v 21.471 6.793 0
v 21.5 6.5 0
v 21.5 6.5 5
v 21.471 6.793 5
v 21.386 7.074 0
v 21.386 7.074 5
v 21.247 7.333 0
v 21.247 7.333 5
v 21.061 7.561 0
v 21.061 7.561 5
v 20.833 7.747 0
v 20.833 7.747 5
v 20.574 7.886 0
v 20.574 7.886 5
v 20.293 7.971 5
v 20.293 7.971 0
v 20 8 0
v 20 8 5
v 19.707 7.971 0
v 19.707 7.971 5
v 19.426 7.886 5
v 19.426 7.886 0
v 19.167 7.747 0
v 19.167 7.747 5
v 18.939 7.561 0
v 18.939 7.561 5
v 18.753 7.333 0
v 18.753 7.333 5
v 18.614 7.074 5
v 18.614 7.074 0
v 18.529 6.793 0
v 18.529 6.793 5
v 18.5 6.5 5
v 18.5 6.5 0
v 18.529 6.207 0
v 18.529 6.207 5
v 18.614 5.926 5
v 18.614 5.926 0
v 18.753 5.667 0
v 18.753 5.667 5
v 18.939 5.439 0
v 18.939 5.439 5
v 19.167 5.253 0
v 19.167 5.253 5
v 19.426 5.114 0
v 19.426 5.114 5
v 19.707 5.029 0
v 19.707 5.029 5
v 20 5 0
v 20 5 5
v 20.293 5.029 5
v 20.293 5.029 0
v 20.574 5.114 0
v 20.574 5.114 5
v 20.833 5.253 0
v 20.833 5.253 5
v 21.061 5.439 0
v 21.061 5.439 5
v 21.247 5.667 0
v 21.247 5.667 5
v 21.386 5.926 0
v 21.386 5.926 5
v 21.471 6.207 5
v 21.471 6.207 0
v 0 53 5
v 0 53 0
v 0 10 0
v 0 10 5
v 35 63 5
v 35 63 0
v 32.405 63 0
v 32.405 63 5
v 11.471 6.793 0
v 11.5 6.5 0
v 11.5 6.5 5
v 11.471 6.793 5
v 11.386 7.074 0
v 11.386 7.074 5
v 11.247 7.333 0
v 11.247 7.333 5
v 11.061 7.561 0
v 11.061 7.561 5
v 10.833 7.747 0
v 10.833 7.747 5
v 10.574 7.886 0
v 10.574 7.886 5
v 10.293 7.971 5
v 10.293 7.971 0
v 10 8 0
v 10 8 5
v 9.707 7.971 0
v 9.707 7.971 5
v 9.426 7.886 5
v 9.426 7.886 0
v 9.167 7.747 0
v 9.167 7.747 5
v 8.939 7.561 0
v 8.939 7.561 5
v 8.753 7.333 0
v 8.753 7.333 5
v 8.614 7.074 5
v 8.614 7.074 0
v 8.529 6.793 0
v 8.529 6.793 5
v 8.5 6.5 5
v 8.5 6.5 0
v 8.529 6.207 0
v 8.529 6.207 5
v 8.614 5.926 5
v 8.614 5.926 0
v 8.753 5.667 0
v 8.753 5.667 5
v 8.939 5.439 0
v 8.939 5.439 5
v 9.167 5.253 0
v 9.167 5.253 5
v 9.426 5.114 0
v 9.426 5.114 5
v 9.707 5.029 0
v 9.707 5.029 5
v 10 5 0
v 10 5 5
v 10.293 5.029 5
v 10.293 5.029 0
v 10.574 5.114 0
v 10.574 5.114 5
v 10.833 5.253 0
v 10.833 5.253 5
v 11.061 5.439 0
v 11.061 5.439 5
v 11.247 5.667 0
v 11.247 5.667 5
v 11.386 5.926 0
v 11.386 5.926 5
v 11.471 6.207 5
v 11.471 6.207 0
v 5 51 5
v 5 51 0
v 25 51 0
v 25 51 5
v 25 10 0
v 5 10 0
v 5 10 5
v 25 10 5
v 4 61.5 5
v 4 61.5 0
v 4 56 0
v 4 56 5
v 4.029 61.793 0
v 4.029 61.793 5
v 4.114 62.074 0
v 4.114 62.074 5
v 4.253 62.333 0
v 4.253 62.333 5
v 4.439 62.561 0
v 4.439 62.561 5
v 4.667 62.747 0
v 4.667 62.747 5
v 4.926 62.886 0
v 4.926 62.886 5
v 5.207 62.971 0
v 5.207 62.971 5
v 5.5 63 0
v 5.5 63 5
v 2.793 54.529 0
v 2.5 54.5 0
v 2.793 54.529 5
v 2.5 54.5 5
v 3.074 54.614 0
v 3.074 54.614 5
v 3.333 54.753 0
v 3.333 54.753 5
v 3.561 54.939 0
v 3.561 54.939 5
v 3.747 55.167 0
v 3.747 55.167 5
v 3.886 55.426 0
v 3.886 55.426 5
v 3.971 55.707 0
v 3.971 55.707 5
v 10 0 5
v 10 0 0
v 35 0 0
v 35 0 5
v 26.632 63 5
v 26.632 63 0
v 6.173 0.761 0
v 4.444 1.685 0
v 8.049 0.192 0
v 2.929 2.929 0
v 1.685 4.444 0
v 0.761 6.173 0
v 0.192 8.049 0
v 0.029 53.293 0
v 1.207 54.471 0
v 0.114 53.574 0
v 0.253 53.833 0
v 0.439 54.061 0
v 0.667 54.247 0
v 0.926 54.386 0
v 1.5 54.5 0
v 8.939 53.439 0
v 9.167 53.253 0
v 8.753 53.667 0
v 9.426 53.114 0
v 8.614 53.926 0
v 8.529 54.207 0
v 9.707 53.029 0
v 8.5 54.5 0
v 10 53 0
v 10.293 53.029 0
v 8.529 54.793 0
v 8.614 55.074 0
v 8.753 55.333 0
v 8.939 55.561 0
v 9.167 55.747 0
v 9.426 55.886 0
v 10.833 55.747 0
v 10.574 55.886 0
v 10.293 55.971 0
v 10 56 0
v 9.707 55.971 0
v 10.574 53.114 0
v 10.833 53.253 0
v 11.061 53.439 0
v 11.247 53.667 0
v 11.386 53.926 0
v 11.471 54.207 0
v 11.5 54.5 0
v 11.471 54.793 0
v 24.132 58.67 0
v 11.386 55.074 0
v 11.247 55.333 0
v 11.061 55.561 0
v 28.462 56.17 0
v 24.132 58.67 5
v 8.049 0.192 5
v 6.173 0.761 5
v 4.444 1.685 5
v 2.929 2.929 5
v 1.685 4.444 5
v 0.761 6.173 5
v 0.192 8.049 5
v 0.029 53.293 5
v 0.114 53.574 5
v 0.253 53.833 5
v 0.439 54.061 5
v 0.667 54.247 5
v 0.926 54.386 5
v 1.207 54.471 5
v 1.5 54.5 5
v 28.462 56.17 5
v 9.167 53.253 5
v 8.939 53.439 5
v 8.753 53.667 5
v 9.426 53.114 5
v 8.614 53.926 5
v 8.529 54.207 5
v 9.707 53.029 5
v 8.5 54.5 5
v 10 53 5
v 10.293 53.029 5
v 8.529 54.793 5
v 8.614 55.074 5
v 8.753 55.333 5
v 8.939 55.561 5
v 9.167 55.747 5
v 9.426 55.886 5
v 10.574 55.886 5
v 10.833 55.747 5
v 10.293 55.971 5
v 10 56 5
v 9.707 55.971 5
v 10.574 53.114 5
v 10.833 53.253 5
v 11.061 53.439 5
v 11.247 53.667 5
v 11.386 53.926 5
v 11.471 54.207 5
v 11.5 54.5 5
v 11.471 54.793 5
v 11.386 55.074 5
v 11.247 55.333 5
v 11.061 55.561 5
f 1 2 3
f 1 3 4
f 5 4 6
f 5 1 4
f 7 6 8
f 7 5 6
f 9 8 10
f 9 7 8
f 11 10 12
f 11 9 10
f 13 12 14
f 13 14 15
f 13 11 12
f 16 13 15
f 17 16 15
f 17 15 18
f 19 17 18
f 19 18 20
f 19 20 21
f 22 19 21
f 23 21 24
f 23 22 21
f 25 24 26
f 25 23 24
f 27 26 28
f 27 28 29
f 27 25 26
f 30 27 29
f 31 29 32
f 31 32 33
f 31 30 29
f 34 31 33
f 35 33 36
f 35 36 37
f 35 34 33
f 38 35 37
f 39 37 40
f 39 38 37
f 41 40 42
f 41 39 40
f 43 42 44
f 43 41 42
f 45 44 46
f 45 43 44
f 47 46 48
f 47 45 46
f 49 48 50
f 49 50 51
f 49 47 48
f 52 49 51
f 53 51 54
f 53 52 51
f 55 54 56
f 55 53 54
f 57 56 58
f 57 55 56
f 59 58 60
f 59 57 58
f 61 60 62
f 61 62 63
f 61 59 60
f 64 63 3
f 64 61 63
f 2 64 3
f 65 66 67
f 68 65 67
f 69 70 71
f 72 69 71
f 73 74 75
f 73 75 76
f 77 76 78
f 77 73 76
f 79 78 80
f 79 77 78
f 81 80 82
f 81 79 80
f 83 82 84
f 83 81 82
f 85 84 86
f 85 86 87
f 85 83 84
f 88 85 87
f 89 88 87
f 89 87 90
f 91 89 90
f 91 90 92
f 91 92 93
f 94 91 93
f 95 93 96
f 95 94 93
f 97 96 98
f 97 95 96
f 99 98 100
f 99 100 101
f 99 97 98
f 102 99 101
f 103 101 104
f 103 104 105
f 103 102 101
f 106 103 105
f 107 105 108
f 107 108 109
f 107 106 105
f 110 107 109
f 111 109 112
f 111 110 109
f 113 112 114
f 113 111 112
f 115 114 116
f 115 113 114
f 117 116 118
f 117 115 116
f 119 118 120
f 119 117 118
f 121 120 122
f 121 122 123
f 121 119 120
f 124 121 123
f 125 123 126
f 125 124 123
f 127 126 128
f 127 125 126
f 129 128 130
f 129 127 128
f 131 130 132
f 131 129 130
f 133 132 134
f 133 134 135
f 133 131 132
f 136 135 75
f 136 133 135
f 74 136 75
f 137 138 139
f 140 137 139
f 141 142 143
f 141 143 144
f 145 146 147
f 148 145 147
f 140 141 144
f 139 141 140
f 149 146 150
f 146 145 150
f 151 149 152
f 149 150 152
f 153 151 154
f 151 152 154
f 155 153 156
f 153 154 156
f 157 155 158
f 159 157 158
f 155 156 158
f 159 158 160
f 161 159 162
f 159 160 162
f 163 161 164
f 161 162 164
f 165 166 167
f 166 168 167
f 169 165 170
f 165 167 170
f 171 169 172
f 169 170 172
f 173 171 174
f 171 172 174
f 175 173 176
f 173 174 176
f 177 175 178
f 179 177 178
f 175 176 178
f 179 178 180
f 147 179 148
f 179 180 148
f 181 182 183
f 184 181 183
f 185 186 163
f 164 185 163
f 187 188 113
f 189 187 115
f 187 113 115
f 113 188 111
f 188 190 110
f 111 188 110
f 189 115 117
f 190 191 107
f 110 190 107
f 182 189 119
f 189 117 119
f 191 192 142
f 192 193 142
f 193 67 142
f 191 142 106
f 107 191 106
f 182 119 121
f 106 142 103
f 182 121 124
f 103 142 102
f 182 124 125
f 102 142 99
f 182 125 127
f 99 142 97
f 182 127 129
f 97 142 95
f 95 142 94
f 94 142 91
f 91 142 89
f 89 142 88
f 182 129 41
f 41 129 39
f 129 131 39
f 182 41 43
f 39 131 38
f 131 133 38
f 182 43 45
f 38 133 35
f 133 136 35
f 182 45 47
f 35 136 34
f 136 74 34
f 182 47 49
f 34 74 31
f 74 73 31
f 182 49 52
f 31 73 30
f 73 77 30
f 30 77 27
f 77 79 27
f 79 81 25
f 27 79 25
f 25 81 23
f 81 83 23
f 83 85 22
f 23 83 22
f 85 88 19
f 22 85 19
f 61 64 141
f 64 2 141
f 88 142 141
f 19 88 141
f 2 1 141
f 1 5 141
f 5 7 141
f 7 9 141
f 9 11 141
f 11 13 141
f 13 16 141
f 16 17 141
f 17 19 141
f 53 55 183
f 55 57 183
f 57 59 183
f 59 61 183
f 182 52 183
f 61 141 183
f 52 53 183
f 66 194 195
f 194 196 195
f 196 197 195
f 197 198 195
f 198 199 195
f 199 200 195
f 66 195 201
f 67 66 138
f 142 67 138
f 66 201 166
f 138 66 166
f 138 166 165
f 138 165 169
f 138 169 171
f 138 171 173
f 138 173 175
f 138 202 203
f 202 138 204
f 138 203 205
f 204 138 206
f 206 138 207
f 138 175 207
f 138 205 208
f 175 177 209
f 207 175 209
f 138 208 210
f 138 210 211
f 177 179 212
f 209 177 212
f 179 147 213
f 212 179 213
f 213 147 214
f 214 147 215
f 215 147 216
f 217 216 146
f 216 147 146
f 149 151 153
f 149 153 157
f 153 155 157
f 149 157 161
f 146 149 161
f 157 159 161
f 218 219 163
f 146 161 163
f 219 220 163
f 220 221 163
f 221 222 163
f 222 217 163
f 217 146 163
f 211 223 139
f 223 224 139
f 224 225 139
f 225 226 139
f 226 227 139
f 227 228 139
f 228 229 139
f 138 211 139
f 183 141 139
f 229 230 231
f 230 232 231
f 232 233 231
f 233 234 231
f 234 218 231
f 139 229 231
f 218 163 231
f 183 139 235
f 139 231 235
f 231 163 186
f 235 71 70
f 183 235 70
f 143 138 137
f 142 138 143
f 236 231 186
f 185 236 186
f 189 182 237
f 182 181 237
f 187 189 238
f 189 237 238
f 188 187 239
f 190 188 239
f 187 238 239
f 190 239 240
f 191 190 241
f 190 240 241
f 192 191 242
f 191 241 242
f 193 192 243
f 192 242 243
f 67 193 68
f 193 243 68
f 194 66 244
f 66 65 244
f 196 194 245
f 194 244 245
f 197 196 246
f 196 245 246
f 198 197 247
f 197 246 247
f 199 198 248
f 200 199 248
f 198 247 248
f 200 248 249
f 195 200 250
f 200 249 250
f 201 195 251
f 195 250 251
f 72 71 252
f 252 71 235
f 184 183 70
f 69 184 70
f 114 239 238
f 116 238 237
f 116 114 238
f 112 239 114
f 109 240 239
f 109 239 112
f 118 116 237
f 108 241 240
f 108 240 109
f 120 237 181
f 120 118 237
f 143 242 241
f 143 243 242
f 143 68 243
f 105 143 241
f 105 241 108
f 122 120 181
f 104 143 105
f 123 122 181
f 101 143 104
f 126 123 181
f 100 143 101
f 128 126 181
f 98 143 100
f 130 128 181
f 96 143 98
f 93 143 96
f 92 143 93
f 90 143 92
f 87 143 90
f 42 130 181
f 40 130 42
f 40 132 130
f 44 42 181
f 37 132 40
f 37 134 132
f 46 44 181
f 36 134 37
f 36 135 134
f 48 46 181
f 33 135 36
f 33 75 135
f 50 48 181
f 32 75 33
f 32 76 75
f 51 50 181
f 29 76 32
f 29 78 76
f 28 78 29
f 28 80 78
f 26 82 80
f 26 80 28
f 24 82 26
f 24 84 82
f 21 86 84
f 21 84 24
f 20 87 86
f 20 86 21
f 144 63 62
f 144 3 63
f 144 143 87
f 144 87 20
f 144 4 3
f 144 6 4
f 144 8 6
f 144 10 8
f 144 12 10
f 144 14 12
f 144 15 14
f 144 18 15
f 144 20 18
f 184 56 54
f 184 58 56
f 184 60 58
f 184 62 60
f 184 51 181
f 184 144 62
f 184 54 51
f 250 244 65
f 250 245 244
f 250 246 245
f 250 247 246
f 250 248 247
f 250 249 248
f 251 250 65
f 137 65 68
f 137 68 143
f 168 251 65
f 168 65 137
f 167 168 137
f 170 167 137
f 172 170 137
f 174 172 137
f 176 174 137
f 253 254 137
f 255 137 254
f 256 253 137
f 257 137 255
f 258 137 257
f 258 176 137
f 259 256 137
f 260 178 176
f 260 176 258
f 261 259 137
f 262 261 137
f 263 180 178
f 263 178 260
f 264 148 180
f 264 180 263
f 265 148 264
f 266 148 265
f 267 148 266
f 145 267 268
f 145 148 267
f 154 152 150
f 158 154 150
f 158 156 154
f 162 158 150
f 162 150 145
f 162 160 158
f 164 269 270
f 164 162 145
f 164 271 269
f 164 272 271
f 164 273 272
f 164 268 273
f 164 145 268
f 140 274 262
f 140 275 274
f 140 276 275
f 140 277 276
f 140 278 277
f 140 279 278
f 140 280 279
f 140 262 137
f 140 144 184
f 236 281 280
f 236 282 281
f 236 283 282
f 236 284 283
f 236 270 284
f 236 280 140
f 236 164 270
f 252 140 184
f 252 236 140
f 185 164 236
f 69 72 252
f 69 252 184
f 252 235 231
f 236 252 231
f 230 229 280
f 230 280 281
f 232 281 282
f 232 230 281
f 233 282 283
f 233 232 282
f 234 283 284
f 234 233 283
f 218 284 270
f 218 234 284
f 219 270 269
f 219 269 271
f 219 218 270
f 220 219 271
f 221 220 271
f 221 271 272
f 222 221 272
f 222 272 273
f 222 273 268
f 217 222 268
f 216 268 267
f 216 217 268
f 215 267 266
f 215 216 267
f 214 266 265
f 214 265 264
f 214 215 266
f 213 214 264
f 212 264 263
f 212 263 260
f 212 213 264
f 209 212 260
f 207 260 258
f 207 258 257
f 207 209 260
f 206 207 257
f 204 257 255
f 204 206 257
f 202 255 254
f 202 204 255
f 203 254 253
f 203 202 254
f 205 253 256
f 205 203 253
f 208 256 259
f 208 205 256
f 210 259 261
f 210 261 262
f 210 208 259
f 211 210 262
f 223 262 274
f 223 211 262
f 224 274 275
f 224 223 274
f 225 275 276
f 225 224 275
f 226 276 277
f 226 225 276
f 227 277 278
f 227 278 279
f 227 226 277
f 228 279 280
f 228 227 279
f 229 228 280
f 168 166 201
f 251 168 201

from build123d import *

# Parameters (mm, degrees)
ESQUISSE1_R        = 1.5
BOSS_EXTRU_1_DEPTH = 5
CONG_2_R           = 10
CONG_4_R           = 1.5


with BuildPart() as part:
    # Esquisse1 → Boss.-Extru.1 (new body)
    with BuildSketch(Plane.XY):
        Polygon((0, 0), (25, 0), (35, 0), (35, 63), (32.405486101, 63), (28.462110428, 56.169872981), (24.131983409, 58.669872981), (26.631983409, 63), (4, 63), (4, 54.5), (0, 54.5), align=None)
        with Locations((10, 54.5)):
            Circle(ESQUISSE1_R, mode=Mode.SUBTRACT)
        with Locations((20, 6.5)):
            Circle(ESQUISSE1_R, mode=Mode.SUBTRACT)
        with Locations((10, 6.5)):
            Circle(ESQUISSE1_R, mode=Mode.SUBTRACT)
        Polygon((15, 51), (5, 51), (5, 10), (25, 10), (25, 51), align=None, mode=Mode.SUBTRACT)
    extrude(amount=BOSS_EXTRU_1_DEPTH)

    # Congé2
    cong_2_edges = [part.edges().sort_by_distance(p)[0] for p in [
        (0, 0, 2.5),
    ]]
    fillet(cong_2_edges, radius=CONG_2_R)

    # Congé4
    cong_4_edges = [part.edges().sort_by_distance(p)[0] for p in [
        (0, 54.5, 2.5),
        (4, 54.5, 2.5),
        (4, 63, 2.5),
    ]]
    fillet(cong_4_edges, radius=CONG_4_R)


solid = part.part
